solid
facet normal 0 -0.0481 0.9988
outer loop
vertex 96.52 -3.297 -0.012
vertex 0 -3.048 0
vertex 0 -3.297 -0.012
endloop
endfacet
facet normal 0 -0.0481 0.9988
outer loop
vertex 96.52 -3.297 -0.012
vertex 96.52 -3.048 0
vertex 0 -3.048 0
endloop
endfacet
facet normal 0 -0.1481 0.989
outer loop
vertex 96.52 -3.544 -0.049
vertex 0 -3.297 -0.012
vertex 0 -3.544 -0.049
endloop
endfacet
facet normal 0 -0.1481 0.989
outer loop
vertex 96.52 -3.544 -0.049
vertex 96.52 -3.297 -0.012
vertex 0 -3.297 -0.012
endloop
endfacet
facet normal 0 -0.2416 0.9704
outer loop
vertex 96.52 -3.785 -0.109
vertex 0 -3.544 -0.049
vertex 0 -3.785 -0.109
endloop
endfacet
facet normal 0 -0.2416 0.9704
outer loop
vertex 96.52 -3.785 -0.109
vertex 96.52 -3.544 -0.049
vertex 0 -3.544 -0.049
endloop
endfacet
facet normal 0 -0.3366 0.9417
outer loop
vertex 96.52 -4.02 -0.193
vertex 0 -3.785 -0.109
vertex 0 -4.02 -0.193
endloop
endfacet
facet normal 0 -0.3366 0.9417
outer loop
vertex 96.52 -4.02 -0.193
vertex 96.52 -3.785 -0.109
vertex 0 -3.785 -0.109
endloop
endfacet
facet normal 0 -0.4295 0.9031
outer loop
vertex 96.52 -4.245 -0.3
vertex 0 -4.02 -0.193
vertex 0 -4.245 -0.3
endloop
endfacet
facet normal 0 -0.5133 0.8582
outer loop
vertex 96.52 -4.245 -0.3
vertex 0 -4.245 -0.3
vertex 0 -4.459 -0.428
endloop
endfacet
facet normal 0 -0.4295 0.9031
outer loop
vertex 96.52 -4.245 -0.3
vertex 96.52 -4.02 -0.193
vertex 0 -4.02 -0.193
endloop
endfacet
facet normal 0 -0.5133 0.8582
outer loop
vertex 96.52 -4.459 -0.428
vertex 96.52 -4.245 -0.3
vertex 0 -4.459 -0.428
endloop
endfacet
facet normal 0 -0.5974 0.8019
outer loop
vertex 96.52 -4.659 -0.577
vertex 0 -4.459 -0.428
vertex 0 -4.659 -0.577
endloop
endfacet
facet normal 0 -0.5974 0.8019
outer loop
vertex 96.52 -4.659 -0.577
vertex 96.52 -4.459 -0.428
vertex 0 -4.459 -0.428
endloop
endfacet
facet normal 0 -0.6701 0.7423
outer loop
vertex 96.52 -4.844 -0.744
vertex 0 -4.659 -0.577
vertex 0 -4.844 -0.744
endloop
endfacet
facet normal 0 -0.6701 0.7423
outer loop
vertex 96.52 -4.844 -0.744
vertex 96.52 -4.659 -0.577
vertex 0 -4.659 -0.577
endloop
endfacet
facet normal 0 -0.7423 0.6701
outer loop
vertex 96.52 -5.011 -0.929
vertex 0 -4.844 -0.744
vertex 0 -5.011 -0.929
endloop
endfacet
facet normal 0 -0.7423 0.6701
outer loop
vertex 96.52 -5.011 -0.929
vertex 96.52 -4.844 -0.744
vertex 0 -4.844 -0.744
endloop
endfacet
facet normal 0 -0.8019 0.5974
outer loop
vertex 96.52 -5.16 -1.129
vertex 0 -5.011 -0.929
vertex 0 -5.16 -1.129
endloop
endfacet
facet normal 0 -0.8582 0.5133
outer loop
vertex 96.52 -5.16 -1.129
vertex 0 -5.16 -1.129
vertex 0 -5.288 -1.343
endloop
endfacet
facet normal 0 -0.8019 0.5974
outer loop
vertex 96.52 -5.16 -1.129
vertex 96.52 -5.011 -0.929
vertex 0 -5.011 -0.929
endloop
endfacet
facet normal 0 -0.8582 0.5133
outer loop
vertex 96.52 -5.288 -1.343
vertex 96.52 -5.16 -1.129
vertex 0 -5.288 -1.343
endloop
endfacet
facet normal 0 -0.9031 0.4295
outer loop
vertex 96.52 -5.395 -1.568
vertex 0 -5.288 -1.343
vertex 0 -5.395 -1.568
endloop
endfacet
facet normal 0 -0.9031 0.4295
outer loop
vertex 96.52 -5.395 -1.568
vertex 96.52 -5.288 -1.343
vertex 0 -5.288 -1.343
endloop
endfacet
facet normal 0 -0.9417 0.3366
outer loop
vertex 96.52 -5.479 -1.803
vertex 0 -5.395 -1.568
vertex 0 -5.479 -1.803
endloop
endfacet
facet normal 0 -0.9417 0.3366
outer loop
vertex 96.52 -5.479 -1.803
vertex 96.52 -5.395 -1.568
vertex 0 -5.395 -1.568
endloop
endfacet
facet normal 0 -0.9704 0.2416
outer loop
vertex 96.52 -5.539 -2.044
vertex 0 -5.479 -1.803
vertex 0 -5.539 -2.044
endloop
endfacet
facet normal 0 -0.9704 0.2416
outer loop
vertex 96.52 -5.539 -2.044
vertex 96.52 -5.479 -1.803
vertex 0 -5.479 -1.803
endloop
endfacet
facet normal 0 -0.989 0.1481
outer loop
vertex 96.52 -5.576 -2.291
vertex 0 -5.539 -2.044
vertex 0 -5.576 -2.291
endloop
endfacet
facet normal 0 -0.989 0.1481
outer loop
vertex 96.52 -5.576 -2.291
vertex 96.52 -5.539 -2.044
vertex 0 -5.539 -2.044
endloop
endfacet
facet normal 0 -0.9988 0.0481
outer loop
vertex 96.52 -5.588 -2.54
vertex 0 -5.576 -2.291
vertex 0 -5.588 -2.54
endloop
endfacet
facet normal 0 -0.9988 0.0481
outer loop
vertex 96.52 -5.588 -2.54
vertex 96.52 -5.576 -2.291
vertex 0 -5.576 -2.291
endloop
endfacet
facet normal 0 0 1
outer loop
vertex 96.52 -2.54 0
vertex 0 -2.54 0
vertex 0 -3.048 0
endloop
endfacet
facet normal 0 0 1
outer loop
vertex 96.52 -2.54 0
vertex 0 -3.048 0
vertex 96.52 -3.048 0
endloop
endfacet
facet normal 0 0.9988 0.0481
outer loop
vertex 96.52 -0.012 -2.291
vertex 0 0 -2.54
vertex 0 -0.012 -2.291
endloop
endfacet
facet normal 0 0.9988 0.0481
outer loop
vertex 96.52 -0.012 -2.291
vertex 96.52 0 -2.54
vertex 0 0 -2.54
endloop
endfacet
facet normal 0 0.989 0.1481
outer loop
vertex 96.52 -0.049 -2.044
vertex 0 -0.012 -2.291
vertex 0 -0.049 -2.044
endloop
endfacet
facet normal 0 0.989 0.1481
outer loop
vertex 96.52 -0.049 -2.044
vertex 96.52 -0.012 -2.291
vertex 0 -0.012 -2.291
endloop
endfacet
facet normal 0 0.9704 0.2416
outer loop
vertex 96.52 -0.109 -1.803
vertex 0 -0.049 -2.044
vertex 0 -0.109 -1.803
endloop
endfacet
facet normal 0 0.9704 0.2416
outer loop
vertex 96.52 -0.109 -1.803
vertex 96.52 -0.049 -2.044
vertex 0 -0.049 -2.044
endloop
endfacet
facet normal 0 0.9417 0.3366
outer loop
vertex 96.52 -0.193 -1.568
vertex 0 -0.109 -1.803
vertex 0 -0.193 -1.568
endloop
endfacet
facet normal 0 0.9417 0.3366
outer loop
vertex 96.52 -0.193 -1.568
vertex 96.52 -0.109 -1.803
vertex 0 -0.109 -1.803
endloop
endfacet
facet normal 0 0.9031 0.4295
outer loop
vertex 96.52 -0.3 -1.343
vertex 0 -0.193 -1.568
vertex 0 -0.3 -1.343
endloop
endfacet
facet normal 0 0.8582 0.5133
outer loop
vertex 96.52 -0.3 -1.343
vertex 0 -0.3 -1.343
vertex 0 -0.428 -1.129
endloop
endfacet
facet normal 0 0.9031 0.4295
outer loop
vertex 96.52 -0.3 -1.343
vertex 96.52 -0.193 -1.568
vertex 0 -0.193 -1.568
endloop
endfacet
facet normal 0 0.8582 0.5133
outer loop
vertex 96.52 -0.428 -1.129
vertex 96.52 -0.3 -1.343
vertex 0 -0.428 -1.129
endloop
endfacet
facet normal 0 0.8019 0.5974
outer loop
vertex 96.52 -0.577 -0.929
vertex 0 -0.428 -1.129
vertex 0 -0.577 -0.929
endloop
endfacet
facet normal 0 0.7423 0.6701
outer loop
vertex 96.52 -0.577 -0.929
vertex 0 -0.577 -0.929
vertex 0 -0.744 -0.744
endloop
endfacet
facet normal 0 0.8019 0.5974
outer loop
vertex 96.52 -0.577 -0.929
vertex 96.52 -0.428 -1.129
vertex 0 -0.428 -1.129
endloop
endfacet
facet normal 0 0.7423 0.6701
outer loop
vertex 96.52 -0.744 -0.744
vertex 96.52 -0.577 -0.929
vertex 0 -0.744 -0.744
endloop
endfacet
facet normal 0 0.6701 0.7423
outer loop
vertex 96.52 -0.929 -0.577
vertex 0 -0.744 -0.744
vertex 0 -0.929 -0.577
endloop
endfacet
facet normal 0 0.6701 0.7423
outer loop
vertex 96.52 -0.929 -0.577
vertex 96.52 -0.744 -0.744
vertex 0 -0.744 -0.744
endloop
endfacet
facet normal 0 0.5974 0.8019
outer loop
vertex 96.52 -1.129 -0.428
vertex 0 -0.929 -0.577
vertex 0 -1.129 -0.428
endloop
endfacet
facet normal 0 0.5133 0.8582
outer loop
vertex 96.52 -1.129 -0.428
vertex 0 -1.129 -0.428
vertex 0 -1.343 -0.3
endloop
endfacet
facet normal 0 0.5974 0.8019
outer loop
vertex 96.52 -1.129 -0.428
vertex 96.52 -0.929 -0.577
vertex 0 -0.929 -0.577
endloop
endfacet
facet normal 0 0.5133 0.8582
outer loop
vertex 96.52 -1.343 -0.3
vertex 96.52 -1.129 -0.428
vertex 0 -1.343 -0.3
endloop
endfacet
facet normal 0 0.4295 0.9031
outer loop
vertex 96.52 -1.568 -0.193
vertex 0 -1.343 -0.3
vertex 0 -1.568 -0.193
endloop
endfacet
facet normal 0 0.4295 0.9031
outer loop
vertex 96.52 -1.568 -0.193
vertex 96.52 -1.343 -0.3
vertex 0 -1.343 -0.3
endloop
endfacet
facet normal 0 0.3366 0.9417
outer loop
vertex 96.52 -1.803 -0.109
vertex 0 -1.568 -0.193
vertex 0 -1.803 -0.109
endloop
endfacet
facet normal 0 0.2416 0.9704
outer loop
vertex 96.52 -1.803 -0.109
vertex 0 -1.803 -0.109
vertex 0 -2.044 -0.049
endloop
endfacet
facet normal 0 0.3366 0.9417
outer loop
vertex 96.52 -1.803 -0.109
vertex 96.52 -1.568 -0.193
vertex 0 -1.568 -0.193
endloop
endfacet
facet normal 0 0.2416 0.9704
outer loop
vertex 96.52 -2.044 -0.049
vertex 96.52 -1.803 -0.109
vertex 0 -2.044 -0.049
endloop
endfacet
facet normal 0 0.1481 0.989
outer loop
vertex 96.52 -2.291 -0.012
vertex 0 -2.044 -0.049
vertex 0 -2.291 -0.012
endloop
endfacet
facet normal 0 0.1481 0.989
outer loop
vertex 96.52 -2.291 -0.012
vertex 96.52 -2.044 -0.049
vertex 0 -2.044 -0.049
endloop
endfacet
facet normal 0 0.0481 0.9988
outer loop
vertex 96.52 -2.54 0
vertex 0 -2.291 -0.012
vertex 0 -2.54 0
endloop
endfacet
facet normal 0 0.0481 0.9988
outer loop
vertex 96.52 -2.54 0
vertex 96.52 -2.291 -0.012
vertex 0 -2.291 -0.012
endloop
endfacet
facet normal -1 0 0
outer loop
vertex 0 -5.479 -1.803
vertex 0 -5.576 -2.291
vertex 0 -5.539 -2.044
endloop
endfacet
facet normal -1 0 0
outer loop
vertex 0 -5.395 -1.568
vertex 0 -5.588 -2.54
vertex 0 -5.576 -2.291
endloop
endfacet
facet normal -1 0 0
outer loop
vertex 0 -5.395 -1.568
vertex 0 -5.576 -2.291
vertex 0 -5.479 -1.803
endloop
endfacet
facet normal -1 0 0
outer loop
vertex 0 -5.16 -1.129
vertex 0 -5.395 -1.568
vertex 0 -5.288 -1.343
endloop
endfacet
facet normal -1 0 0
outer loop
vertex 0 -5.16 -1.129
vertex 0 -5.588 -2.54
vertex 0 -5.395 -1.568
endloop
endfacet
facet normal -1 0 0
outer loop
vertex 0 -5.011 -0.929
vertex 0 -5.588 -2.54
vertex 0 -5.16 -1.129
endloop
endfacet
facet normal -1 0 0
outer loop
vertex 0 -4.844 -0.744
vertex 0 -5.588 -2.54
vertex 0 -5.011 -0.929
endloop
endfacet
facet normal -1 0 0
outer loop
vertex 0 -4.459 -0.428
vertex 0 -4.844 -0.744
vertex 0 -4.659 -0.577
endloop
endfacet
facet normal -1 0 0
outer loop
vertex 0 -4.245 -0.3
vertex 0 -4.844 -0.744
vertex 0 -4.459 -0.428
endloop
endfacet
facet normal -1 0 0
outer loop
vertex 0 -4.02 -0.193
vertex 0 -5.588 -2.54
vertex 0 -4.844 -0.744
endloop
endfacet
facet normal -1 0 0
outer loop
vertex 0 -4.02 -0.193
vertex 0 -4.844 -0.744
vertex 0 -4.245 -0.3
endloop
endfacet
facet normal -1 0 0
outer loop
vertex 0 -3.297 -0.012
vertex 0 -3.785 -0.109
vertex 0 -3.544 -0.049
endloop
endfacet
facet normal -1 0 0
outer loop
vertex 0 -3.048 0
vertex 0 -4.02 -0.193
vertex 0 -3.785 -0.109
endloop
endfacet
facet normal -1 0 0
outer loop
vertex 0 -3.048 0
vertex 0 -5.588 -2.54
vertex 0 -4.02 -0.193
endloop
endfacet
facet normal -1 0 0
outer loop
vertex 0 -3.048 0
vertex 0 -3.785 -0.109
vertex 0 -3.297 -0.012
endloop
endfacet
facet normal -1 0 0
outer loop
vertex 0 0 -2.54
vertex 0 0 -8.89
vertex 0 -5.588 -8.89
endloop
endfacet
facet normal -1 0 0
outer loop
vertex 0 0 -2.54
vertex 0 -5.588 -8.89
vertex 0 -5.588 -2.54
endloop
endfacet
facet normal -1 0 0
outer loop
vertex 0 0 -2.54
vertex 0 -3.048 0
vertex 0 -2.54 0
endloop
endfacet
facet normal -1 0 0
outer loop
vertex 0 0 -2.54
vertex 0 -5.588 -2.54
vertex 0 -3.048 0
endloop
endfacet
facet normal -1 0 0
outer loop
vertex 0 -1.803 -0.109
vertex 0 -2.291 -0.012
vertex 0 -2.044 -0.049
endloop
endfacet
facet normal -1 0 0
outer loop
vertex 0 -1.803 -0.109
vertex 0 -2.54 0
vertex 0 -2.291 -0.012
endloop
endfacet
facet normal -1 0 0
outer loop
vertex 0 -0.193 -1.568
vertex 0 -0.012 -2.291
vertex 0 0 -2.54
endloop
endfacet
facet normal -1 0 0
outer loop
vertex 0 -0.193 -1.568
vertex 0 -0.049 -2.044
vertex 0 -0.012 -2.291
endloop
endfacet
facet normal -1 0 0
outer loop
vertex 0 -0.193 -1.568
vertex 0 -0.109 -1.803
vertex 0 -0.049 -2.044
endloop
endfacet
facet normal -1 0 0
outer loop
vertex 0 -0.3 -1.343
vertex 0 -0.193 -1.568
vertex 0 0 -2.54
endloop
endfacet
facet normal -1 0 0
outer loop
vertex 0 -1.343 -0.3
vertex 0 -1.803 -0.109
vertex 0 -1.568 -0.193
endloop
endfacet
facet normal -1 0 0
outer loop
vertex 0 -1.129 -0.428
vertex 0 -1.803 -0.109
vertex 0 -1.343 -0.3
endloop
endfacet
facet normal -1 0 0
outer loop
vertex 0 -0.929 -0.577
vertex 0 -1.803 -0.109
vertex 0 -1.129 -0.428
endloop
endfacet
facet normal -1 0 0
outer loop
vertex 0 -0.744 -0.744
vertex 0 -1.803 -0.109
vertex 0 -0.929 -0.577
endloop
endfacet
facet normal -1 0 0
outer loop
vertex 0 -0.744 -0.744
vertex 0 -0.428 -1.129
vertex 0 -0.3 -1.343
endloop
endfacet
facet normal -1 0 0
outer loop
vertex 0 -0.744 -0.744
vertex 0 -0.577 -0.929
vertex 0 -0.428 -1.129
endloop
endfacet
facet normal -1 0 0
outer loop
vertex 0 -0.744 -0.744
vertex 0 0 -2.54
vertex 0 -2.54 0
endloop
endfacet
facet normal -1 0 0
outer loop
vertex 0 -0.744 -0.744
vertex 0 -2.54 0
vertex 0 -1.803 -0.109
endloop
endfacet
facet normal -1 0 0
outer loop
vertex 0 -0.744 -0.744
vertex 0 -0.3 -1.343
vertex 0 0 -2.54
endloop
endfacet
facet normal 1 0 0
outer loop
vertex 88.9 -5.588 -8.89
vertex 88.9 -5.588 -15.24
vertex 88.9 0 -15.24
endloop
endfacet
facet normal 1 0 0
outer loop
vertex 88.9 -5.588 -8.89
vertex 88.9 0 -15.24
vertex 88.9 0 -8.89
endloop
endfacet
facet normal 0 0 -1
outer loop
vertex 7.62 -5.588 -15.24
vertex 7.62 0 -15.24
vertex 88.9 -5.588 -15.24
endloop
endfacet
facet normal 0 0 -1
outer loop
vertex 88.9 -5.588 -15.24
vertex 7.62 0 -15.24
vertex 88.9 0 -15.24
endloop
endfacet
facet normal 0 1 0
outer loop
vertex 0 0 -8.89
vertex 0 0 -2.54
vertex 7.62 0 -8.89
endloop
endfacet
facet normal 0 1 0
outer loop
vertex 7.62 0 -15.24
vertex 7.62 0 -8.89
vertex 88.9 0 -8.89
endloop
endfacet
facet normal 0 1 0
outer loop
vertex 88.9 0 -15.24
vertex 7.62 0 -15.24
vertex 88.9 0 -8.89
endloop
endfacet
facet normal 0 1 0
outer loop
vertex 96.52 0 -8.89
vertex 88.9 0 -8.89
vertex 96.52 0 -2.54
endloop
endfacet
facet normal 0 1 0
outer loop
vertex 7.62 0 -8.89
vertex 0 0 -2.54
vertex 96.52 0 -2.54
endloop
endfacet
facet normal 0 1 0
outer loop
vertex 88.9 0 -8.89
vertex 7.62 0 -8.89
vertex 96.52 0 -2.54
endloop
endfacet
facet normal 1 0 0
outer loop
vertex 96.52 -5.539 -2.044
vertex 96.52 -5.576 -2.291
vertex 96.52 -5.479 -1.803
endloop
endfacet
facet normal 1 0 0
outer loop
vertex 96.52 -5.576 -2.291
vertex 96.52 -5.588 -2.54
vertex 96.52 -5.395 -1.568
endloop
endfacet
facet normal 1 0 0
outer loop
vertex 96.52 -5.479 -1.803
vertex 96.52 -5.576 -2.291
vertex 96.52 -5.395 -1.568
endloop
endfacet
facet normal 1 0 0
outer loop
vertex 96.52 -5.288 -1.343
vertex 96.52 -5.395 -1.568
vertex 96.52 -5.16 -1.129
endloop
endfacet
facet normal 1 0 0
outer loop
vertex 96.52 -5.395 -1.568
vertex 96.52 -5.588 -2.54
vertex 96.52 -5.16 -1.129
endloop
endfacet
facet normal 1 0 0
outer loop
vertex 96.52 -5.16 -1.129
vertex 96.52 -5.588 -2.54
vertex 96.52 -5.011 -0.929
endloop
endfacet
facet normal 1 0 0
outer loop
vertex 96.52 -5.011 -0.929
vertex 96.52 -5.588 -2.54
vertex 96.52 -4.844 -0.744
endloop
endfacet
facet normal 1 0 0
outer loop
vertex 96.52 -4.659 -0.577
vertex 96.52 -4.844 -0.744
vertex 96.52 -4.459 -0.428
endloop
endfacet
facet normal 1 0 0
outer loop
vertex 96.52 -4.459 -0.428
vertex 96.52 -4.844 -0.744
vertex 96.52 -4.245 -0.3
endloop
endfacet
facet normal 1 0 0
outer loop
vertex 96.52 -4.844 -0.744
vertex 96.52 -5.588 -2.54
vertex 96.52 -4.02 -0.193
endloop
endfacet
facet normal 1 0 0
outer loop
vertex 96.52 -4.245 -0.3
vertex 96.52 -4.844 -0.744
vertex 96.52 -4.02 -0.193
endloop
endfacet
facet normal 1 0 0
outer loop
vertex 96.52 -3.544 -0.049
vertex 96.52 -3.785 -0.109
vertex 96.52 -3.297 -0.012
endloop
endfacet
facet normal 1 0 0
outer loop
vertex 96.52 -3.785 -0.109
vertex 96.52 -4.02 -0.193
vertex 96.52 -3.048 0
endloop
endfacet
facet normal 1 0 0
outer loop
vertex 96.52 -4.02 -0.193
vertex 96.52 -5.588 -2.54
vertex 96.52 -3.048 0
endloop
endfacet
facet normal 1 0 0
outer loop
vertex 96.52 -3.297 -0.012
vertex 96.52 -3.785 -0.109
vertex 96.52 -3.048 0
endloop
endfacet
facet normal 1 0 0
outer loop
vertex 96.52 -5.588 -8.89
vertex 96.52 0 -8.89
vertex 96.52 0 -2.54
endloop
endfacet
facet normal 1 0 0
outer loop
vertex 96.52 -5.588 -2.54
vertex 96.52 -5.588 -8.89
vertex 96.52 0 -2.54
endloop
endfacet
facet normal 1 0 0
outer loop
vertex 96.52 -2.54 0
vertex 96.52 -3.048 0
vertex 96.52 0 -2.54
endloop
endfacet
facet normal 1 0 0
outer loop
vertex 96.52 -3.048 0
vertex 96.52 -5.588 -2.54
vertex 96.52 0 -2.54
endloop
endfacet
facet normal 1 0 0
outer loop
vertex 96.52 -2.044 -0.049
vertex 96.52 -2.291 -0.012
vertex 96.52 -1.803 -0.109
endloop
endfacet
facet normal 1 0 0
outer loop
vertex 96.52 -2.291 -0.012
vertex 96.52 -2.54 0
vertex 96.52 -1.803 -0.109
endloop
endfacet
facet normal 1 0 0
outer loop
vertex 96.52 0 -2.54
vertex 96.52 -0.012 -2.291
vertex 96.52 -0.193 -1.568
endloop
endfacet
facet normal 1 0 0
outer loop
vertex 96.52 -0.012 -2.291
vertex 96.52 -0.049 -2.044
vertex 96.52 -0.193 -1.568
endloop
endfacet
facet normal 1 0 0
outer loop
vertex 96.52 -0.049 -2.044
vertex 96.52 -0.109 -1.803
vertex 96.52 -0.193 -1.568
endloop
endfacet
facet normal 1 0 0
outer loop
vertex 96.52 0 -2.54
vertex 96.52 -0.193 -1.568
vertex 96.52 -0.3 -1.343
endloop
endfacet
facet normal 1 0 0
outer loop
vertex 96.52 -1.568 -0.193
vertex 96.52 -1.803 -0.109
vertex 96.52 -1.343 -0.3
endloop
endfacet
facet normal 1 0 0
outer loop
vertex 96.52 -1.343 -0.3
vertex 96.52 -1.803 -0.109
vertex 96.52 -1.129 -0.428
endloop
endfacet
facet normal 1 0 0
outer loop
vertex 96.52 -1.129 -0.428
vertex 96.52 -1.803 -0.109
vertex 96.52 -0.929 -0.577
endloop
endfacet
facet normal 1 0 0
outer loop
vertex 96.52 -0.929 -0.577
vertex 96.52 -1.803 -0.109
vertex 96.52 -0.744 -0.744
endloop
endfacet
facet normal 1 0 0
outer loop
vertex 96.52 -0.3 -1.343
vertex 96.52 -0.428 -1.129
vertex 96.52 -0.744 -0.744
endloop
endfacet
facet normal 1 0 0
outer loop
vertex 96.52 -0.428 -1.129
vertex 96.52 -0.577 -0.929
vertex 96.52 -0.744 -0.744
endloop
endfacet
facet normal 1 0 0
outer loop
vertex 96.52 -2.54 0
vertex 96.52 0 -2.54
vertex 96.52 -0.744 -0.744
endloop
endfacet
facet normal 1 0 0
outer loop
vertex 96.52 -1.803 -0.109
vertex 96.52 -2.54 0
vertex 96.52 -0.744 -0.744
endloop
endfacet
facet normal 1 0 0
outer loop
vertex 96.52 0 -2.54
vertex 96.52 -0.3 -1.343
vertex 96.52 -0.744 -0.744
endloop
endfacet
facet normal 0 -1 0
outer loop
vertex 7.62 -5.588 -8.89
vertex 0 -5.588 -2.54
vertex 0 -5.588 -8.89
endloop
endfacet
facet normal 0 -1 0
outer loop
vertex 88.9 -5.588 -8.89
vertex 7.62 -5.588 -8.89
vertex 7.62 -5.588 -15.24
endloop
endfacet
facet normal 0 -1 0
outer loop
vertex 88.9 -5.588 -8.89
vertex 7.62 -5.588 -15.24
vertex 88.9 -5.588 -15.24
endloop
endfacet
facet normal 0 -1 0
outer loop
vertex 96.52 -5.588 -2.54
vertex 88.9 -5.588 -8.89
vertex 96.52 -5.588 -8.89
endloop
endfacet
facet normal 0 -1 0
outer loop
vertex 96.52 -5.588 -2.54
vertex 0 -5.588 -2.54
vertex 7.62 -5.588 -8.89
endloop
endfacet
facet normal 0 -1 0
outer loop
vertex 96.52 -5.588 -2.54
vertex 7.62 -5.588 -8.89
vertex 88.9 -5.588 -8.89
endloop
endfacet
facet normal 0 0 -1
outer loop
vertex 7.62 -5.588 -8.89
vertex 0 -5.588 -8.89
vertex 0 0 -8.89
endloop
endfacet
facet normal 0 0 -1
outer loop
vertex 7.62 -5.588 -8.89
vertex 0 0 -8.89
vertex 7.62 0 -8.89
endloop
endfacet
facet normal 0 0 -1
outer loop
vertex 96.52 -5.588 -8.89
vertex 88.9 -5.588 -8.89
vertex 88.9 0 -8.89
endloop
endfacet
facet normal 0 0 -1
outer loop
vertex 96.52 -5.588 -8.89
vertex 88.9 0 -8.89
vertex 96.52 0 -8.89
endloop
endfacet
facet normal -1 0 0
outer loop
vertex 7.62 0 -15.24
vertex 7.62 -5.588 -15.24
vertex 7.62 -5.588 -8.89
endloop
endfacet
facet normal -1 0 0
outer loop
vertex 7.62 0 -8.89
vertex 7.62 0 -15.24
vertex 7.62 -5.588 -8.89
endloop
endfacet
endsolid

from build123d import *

# Parameters (mm, degrees)
F0_W     = 96.52
F0_H     = 15.24
F1_DEPTH = 5.588
F2_W     = 7.62
F2_H     = 6.35
F3_DEPTH = 25.4
F4_R     = 2.54


with BuildPart() as f1:
    # F0 (on Front) → F1 (new body)
    with BuildSketch(Plane.XZ):
        with Locations((48.26, -7.62)):
            Rectangle(F0_W, F0_H)
    extrude(amount=F1_DEPTH)

    # F2 (on face) → F3 (cut)
    with BuildSketch(Plane.XZ.offset(5.588)):
        with Locations((92.71, -12.065)):
            Rectangle(F2_W, F2_H)
        with Locations((3.81, -12.065)):
            Rectangle(F2_W, F2_H)
    extrude(amount=-F3_DEPTH, mode=Mode.SUBTRACT)

    # F4
    f4_edges = [f1.edges().sort_by_distance(p)[0] for p in [
        (48.26, 0, 0),
        (48.26, -5.588, 0),
    ]]
    fillet(f4_edges, radius=F4_R)


solid = f1.part
